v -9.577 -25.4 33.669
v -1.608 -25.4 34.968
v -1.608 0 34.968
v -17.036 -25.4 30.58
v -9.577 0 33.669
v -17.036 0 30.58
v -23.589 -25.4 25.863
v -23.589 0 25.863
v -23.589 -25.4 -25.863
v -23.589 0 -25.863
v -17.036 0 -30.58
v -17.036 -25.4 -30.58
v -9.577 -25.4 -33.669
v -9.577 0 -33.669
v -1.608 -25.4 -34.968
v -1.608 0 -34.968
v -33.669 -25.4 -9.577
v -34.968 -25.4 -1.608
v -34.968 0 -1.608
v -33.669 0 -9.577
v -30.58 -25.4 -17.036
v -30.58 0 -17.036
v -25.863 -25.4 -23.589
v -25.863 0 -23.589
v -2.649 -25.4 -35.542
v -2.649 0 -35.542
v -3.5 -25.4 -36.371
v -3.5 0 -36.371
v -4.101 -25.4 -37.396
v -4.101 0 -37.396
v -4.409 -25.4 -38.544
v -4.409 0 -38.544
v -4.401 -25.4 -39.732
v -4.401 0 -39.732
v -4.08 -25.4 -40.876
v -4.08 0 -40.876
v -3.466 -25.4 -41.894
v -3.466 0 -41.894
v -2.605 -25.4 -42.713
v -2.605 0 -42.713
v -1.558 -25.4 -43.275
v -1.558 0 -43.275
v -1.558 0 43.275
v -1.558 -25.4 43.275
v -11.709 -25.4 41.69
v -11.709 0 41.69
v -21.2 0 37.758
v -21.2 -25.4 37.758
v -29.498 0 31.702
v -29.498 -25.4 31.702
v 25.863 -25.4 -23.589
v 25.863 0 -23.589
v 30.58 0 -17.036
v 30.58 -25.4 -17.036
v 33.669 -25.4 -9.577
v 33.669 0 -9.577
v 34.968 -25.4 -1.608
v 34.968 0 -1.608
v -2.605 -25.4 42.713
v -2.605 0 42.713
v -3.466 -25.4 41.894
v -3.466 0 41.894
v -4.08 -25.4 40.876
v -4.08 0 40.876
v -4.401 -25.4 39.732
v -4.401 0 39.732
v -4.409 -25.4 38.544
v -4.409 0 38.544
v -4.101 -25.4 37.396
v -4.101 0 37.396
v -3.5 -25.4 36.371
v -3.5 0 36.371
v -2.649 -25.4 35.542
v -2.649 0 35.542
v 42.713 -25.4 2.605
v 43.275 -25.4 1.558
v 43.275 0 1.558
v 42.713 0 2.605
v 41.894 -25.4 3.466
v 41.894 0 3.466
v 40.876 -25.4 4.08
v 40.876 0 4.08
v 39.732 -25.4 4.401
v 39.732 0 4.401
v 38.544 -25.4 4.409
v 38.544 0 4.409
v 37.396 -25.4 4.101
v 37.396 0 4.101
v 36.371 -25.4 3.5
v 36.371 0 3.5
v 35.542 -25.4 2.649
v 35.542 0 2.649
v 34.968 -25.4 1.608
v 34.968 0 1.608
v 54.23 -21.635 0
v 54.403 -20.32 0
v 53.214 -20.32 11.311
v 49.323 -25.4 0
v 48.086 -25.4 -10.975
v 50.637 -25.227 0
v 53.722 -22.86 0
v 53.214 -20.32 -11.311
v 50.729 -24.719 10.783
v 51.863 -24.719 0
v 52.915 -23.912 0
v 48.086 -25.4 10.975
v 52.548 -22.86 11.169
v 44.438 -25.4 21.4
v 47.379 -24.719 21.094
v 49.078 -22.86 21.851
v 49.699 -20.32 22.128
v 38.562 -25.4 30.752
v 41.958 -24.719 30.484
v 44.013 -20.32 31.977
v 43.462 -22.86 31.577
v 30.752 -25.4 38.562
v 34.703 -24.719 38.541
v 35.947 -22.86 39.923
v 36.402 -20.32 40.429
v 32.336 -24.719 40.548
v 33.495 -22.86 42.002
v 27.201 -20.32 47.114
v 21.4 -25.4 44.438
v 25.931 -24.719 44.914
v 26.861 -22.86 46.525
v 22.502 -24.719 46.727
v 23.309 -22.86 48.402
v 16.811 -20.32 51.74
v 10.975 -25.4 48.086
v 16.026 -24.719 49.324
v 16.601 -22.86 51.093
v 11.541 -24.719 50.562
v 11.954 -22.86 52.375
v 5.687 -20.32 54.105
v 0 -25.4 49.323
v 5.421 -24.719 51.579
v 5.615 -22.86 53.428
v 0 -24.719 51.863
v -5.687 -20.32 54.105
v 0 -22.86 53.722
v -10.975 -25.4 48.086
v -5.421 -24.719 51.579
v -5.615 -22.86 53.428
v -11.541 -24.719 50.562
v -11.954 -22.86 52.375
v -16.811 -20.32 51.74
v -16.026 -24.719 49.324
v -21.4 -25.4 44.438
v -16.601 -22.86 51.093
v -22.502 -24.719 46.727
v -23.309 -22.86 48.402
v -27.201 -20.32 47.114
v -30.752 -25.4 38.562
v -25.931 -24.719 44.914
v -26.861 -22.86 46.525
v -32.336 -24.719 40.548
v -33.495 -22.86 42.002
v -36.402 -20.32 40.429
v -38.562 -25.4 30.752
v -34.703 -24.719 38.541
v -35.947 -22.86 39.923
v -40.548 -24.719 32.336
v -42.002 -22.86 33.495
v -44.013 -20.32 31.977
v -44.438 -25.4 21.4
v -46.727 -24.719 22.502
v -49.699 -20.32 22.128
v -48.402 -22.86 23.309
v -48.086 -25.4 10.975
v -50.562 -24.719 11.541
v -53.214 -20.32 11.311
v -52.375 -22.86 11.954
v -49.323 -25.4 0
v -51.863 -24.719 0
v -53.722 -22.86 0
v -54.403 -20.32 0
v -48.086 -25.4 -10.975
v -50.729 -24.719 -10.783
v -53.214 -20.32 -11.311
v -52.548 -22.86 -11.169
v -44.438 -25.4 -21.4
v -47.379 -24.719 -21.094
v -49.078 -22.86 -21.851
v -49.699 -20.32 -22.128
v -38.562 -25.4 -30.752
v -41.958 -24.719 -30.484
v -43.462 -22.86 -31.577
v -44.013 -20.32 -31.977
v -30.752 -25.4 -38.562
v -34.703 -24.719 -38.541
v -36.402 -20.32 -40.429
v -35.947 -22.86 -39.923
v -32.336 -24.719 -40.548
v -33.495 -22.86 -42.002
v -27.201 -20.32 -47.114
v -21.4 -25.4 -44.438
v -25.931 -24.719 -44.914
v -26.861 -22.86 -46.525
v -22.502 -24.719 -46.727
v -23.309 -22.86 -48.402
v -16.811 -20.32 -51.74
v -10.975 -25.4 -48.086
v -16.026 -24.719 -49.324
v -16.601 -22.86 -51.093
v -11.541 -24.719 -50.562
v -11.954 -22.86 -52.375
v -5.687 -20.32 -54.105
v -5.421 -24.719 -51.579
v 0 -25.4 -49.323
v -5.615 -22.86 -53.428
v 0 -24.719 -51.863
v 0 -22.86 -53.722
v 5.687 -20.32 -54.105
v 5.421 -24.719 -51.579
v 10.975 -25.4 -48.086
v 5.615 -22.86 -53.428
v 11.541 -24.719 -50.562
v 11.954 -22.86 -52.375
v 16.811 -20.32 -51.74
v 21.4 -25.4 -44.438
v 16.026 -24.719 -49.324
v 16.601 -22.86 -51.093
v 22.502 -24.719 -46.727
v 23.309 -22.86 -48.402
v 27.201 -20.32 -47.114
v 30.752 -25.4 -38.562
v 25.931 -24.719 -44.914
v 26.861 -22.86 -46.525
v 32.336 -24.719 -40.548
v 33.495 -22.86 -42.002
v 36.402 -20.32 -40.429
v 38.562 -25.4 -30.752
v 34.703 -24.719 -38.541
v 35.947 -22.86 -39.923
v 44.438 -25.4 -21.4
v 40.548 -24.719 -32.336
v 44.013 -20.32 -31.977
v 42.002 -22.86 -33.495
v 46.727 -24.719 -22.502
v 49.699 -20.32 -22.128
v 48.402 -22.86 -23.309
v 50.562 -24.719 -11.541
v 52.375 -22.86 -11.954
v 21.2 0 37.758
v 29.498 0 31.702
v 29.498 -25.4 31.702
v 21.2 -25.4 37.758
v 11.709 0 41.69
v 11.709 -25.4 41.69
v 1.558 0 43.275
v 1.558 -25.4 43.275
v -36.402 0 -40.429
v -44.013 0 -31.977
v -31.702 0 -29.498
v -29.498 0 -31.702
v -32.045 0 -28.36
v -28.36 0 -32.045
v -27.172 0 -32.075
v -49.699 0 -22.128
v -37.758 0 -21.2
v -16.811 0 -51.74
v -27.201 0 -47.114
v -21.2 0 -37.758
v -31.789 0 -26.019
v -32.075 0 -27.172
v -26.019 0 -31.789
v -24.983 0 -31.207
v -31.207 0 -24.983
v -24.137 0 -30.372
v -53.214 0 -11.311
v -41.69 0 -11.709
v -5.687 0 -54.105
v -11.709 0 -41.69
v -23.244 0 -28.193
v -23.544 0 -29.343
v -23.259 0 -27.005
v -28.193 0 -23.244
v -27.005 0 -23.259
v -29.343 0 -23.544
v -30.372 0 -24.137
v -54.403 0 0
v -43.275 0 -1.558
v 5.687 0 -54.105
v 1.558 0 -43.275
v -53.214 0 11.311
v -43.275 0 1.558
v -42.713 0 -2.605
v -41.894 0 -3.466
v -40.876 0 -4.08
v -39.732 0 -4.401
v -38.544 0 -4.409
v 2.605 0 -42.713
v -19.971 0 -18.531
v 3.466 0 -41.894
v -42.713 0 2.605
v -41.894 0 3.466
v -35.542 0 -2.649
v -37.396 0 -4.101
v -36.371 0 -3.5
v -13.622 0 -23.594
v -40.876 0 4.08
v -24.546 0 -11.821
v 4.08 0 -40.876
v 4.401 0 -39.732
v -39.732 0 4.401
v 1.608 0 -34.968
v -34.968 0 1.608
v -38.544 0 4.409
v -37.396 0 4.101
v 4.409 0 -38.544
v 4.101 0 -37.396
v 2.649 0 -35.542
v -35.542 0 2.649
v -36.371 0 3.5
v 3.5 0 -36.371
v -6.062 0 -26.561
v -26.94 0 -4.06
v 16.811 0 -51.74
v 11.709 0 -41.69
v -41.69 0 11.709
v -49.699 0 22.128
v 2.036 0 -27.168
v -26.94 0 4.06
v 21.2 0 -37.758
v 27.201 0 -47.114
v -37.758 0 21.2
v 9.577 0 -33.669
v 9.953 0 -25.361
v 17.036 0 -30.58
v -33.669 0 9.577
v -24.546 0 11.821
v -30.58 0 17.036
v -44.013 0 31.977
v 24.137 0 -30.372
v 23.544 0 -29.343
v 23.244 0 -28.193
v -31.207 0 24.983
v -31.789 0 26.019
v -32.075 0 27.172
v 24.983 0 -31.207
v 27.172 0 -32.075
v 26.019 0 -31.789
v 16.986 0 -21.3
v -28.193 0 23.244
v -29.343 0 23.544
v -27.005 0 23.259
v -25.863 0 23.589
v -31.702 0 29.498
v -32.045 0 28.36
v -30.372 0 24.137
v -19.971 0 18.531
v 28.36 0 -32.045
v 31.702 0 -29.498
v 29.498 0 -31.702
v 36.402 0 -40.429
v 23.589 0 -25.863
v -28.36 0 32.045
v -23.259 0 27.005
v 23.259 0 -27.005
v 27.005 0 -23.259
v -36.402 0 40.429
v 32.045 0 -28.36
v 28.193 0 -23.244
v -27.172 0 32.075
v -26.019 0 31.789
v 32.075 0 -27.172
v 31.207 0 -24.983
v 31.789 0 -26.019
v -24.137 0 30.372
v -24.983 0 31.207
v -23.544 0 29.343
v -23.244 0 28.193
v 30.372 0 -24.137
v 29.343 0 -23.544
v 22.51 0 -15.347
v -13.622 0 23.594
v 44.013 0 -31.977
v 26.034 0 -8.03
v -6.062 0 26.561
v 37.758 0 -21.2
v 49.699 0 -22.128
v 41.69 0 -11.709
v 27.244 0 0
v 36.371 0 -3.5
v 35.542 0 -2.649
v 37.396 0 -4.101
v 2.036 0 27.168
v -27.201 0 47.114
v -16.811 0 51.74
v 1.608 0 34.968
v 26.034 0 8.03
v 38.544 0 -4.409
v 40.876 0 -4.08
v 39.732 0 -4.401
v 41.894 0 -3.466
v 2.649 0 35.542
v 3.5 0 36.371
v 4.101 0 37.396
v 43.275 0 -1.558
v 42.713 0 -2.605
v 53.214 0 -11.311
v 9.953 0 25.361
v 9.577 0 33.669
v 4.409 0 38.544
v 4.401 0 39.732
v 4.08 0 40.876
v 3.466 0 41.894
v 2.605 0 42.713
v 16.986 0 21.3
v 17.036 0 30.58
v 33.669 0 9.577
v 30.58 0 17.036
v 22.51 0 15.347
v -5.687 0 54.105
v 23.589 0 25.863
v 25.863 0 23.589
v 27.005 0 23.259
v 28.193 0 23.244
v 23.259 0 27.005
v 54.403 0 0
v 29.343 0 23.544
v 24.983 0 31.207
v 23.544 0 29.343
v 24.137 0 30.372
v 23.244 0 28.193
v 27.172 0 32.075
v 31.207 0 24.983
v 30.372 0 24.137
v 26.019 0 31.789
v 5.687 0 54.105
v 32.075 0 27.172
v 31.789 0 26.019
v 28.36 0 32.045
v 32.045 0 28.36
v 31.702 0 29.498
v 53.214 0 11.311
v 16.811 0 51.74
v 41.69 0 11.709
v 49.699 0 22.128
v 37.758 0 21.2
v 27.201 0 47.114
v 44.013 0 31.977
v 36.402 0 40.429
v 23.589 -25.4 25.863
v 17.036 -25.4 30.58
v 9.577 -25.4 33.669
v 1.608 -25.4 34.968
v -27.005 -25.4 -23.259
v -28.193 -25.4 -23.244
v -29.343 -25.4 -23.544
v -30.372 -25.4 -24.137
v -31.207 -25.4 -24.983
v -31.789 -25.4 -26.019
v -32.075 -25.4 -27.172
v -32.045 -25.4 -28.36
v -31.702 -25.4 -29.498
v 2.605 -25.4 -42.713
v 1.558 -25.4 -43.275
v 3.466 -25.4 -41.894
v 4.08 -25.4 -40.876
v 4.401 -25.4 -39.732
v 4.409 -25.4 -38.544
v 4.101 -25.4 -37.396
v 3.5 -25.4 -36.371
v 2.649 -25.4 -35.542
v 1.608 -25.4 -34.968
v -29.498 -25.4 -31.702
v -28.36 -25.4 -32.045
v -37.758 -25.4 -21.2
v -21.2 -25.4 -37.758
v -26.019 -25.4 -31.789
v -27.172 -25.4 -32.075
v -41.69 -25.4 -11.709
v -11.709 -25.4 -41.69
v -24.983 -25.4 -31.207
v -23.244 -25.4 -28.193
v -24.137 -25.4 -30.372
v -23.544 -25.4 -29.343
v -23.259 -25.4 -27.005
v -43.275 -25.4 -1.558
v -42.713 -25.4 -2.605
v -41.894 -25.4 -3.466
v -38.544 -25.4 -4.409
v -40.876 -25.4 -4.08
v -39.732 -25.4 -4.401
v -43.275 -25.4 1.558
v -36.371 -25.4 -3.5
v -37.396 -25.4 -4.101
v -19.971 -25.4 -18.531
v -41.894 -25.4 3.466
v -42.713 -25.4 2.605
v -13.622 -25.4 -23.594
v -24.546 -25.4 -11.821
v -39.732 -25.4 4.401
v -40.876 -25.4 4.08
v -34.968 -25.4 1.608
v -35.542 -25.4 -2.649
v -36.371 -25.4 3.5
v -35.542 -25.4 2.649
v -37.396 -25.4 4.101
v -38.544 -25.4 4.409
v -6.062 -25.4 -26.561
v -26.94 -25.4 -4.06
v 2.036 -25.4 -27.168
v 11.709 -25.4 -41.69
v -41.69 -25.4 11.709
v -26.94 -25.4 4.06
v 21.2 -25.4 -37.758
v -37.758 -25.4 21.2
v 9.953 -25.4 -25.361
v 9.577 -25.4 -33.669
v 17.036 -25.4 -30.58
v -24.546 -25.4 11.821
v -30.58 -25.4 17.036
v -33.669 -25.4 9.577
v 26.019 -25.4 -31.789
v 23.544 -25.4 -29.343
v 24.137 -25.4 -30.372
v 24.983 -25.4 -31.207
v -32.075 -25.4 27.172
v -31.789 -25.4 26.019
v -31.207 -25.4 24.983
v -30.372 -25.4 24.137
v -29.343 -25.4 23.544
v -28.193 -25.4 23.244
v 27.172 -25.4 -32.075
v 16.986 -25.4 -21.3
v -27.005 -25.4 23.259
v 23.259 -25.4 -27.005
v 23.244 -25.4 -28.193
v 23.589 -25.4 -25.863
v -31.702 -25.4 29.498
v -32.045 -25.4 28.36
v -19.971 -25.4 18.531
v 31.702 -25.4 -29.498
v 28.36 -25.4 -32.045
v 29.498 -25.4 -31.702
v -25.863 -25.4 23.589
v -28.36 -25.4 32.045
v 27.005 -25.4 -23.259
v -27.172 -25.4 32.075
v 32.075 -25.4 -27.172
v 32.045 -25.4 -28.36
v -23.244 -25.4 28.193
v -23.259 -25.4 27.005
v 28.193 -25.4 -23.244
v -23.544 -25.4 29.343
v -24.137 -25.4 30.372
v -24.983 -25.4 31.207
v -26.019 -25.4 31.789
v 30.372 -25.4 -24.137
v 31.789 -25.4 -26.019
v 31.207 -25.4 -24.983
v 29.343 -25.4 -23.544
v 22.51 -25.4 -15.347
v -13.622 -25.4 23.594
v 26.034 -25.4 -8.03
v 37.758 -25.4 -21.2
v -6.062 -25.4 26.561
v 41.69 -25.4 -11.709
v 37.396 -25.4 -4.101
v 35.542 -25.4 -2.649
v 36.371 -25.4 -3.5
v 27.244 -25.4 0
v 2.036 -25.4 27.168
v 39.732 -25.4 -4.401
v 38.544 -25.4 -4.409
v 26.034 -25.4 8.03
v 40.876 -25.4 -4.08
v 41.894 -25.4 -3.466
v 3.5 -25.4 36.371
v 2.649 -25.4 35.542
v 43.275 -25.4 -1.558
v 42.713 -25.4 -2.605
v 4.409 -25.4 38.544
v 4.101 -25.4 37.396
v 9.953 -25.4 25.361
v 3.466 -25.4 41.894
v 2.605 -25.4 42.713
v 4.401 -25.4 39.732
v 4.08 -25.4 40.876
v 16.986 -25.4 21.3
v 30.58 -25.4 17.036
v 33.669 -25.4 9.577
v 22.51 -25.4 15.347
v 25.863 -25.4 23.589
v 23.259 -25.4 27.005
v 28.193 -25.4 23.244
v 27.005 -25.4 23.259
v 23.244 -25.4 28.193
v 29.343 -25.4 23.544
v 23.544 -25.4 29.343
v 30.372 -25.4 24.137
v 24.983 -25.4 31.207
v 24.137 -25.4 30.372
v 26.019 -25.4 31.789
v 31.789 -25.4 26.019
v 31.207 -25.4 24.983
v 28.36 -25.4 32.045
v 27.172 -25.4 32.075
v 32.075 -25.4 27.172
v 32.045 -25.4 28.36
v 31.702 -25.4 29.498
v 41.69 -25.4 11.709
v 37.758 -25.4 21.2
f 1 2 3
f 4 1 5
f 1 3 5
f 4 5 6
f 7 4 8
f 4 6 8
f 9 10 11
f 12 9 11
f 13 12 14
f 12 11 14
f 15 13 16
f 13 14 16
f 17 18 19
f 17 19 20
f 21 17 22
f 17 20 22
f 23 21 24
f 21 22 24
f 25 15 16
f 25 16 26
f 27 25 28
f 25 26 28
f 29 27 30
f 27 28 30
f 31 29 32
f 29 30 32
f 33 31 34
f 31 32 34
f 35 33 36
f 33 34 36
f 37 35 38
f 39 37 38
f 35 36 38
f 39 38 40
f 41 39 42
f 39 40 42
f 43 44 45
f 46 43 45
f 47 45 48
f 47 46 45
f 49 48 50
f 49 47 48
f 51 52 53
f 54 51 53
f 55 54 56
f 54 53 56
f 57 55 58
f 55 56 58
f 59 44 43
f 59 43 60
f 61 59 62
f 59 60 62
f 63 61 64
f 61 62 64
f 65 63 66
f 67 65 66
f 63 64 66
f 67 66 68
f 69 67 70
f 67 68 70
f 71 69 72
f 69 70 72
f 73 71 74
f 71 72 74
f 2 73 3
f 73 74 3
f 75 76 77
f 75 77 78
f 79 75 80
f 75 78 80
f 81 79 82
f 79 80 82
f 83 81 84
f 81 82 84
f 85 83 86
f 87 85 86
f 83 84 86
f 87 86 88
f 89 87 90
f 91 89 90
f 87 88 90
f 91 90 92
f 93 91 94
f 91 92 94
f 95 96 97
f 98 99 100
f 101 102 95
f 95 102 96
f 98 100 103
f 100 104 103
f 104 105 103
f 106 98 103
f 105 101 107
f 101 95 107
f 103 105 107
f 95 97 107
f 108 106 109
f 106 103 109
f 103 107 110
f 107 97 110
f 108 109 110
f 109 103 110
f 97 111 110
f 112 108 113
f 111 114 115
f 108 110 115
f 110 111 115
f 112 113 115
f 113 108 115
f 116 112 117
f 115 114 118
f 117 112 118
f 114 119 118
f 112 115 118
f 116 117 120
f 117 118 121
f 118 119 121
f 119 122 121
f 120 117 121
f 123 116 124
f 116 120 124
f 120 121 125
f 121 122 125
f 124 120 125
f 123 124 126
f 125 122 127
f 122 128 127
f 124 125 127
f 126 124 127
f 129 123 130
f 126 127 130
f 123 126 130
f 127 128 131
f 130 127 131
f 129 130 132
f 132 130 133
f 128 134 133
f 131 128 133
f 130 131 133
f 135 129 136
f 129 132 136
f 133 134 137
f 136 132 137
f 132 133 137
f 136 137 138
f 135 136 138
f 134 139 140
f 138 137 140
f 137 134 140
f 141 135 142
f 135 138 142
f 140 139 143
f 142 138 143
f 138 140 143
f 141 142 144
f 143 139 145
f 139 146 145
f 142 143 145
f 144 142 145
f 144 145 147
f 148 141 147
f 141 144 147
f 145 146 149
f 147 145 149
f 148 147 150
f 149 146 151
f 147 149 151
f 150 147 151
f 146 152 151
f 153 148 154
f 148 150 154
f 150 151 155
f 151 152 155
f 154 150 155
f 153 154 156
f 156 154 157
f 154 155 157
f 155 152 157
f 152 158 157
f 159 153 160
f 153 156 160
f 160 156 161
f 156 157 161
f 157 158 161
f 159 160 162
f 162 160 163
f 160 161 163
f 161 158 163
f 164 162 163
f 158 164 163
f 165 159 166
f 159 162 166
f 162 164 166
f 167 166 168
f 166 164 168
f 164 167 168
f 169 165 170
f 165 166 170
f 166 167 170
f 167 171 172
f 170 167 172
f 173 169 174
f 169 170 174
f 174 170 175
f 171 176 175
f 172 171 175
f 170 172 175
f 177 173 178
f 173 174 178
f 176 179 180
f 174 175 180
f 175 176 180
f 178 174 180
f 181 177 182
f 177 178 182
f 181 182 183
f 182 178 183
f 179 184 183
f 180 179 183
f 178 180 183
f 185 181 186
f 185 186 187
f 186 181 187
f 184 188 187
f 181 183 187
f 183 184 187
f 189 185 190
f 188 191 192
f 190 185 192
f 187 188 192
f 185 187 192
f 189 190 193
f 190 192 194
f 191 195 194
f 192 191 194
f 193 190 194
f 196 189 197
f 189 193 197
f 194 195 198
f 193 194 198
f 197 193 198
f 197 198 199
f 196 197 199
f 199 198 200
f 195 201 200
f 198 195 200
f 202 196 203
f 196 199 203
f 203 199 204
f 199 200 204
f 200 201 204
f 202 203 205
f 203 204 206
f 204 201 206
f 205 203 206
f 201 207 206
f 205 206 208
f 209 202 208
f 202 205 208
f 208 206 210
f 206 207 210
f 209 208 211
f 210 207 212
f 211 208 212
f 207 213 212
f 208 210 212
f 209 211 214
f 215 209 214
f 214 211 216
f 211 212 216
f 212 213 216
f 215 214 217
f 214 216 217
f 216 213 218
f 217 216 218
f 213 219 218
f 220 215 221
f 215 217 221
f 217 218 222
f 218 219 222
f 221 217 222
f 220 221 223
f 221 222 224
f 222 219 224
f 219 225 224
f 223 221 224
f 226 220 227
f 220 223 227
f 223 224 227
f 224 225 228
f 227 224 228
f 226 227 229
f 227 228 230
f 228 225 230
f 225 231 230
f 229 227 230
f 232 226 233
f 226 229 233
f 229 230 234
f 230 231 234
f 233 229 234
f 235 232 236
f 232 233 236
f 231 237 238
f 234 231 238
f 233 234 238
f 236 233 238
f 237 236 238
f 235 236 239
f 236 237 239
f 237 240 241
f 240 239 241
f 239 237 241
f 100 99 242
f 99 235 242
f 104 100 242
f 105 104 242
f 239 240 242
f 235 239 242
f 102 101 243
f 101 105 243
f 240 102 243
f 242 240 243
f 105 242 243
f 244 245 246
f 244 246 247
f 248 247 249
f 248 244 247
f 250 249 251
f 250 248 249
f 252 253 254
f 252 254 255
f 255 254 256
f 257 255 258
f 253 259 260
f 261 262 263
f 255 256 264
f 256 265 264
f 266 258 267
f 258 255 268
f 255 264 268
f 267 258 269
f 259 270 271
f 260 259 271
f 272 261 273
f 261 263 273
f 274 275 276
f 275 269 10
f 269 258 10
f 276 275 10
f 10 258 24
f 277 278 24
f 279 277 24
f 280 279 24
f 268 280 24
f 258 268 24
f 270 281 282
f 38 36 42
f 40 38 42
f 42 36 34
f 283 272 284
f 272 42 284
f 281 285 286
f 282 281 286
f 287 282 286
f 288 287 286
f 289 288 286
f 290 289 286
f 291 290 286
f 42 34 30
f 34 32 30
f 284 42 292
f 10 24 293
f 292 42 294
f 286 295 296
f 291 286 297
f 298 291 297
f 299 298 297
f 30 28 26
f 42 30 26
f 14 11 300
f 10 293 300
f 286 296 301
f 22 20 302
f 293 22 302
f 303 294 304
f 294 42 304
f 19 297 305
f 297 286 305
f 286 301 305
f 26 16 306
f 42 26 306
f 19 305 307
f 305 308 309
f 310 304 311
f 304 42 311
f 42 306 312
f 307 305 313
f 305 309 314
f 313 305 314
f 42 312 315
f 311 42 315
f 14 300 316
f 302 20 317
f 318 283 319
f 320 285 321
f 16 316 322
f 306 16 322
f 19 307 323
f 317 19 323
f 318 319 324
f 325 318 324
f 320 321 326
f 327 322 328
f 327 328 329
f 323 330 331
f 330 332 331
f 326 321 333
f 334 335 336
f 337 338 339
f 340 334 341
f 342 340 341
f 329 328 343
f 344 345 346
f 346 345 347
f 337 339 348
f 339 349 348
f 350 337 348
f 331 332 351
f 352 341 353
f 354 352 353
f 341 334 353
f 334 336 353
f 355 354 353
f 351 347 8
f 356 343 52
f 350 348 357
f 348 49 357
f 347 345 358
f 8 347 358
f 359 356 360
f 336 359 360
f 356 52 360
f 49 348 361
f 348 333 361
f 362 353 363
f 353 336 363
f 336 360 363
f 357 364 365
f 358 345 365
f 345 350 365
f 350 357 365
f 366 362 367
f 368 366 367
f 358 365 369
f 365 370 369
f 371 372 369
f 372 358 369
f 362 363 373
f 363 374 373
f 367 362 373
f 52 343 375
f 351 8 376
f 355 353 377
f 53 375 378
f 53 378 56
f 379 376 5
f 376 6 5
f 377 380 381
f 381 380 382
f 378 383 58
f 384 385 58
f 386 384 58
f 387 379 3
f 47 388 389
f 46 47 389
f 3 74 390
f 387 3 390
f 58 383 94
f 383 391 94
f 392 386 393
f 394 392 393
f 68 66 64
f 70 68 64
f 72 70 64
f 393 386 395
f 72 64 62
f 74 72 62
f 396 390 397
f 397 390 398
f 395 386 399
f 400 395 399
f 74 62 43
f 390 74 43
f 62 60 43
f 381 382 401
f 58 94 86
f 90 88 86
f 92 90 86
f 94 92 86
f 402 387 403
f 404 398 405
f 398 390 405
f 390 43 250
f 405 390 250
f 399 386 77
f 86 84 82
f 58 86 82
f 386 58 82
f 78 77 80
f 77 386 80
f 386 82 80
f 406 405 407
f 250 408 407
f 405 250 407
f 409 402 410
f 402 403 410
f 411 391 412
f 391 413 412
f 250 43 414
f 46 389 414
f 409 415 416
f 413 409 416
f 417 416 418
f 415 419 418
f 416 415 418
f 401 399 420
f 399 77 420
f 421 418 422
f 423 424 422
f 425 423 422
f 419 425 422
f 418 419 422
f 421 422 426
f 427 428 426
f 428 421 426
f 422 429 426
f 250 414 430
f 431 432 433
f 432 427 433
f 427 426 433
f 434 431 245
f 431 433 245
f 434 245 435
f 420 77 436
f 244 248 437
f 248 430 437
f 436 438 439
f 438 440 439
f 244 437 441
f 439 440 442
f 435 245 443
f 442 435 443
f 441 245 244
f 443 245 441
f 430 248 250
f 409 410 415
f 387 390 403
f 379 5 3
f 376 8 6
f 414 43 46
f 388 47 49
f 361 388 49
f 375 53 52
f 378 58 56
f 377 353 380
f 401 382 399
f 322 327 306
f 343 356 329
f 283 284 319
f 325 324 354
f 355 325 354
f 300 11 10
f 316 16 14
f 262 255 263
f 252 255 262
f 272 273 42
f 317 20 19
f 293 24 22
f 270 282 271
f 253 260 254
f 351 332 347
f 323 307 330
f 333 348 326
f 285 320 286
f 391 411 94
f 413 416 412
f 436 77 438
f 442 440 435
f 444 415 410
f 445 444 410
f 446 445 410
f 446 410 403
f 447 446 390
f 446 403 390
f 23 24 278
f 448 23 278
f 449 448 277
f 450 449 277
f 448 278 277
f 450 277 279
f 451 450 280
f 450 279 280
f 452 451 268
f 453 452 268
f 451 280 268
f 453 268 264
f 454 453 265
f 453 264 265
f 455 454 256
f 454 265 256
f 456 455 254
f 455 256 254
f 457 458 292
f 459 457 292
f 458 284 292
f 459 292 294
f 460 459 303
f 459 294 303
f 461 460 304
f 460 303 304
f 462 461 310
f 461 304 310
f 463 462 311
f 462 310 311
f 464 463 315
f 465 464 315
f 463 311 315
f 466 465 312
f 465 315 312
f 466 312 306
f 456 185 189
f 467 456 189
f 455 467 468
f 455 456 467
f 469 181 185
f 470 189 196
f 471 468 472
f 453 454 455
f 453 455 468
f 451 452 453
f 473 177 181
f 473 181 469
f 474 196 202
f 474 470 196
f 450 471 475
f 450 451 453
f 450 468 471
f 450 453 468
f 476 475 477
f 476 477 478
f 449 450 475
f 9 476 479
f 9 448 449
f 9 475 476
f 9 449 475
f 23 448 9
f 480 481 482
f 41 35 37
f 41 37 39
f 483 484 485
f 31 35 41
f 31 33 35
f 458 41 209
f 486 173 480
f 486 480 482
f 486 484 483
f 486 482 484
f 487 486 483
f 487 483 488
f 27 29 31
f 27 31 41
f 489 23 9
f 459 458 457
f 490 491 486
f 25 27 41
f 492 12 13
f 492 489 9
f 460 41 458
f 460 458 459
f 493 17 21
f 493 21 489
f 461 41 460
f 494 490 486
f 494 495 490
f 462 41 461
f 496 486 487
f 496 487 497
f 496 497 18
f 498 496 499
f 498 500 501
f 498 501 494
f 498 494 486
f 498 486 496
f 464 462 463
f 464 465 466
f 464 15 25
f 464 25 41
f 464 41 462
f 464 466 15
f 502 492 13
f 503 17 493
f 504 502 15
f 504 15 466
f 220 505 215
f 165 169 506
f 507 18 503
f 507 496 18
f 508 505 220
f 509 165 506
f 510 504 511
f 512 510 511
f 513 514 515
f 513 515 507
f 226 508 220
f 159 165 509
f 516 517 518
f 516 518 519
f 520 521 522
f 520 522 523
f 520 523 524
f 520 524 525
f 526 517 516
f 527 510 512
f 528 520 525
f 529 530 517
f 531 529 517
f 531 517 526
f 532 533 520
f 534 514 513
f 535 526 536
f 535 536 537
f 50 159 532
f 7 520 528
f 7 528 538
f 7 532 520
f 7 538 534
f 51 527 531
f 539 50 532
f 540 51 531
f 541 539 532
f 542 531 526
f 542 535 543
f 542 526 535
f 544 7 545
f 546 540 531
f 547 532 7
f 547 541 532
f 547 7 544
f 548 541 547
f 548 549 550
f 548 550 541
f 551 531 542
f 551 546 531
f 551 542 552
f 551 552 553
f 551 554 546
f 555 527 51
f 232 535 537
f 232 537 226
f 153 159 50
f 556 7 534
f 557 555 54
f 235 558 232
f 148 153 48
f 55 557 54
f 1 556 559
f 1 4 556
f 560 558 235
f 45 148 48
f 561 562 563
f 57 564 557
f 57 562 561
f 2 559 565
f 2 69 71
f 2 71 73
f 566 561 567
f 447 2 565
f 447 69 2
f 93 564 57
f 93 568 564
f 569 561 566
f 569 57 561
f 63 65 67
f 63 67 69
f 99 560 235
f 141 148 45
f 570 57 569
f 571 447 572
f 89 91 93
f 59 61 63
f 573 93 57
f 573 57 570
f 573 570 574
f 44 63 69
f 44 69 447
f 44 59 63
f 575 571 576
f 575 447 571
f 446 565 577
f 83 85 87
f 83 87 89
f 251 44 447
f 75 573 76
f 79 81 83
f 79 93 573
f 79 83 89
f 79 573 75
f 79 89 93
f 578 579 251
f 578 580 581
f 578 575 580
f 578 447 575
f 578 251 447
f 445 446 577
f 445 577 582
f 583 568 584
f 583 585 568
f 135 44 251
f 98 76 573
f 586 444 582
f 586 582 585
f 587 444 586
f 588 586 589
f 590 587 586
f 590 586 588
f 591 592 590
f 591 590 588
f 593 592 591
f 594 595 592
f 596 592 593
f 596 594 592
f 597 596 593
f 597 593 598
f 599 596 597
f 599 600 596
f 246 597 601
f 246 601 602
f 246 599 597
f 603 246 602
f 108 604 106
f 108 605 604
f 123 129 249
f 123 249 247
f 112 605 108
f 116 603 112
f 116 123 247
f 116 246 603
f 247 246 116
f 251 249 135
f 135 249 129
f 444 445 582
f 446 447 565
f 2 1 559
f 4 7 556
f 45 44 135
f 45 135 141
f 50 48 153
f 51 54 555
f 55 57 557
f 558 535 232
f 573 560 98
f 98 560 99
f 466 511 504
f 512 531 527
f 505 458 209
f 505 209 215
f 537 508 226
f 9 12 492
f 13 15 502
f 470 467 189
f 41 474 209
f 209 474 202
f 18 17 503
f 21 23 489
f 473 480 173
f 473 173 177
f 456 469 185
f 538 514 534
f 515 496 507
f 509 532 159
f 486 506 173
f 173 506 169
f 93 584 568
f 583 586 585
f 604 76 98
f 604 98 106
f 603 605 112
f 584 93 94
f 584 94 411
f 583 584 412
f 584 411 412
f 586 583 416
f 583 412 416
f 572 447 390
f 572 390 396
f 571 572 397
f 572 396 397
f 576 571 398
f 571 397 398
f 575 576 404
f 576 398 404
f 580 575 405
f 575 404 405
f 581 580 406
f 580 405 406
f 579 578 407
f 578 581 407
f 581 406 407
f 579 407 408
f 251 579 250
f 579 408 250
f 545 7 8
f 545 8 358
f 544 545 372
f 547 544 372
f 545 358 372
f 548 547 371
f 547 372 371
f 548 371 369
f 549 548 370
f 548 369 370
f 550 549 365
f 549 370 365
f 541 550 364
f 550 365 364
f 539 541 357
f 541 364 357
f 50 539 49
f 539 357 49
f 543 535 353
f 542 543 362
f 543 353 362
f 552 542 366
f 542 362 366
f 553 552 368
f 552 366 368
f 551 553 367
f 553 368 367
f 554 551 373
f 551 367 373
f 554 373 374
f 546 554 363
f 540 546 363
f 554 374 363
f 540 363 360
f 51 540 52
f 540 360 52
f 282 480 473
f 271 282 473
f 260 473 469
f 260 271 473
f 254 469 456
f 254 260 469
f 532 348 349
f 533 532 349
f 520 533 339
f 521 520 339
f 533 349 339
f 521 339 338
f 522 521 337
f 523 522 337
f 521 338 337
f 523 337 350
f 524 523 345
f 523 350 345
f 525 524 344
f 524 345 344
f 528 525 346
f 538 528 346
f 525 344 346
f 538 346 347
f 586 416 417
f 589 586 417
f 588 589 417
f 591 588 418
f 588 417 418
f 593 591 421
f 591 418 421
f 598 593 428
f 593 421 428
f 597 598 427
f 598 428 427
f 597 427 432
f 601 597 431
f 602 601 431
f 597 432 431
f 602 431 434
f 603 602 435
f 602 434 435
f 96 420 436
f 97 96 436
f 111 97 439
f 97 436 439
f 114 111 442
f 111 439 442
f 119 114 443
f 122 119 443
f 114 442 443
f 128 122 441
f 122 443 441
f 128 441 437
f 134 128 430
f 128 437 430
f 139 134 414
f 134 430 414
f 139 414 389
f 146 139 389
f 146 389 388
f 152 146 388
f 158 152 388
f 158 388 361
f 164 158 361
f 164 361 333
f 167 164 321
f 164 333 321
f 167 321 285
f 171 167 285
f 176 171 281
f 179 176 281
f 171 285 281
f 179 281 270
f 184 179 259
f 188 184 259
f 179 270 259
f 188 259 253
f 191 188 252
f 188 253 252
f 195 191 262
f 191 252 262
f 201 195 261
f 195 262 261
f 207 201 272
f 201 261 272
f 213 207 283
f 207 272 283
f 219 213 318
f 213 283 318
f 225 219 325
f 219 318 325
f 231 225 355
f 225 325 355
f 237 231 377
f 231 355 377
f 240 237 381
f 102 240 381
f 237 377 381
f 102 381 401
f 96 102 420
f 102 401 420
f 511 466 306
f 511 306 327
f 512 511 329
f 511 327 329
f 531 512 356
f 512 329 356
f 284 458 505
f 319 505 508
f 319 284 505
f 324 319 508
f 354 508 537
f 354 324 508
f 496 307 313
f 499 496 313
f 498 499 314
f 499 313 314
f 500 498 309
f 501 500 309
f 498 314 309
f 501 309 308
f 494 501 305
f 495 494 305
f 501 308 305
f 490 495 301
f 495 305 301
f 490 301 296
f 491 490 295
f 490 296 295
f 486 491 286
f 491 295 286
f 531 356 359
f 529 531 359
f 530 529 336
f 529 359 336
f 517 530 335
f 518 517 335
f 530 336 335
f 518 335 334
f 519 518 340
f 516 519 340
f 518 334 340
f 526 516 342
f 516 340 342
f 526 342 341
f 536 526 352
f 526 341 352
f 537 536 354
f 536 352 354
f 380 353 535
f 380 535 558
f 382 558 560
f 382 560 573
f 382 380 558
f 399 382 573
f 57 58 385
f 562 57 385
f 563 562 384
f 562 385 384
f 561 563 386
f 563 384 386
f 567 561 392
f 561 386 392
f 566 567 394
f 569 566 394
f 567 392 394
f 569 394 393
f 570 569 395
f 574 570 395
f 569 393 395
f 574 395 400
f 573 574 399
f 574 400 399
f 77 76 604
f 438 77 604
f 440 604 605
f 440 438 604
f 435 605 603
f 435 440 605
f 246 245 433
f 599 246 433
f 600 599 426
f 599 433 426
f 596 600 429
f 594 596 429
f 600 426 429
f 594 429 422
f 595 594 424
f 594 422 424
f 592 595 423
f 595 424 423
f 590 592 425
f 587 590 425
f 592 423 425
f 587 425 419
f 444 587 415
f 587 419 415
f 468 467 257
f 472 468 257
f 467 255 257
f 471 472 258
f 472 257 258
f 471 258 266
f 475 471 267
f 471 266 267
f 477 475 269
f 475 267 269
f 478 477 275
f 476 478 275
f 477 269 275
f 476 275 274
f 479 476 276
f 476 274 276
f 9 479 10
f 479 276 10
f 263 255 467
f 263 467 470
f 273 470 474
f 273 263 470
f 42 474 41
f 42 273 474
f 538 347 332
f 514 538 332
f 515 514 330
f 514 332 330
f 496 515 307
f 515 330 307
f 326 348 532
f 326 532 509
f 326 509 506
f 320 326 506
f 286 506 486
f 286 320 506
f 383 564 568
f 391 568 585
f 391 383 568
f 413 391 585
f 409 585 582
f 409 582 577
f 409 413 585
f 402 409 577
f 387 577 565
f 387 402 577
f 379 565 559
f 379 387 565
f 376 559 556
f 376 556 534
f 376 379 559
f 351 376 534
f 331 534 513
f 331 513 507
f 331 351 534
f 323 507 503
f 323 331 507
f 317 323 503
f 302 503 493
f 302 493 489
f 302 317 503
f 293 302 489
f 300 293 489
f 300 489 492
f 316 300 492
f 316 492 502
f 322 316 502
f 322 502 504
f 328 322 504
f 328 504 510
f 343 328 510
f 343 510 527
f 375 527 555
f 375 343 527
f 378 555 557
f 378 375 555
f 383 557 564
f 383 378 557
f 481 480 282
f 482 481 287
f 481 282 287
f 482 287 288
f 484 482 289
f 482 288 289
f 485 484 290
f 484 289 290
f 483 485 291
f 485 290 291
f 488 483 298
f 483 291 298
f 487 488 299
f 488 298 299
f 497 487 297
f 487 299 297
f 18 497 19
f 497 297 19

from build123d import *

# Parameters (mm, degrees)
F0_R     = 54.402648
F0_R_2   = 43.302675
F1_DEPTH = 25.4
F2_R     = 35.004795
F2_R_2   = 27.243886
F3_DEPTH = 25.4
F4_R     = 4.445
F5_DEPTH = 25.4
F6_R     = 5.08


with BuildPart() as f1:
    # F0 (on Front) → F1 (new body)
    with BuildSketch(Plane.XZ):
        Circle(F0_R)
        Circle(F0_R_2, mode=Mode.SUBTRACT)
    extrude(amount=F1_DEPTH)



with BuildPart() as f3:
    # F2 (on Front) → F3 (new body)
    with BuildSketch(Plane.XZ):
        Circle(F2_R)
        Circle(F2_R_2, mode=Mode.SUBTRACT)
    extrude(amount=F3_DEPTH)


with BuildPart() as f1_1:
    add(f1.part)

    add(f3.part)  # F5 merges F3
    # F4 (on Front) → F5 (join)
    with BuildSketch(Plane.XZ):
        with Locations((0, 39.111675)):
            Circle(F4_R)
        with Locations((-27.65613, 27.65613)):
            Circle(F4_R)
        with Locations((-39.111675, 0)):
            Circle(F4_R)
        with Locations((-27.65613, -27.65613)):
            Circle(F4_R)
        with Locations((0, -39.111675)):
            Circle(F4_R)
        with Locations((27.65613, -27.65613)):
            Circle(F4_R)
        with Locations((39.111675, 0)):
            Circle(F4_R)
        with Locations((27.65613, 27.65613)):
            Circle(F4_R)
    extrude(amount=F5_DEPTH)

    # F6
    f6_edges = [f1_1.edges().sort_by_distance(p)[0] for p in [
        (-54.402648, -25.4, 0),
    ]]
    fillet(f6_edges, radius=F6_R)


solid = f1_1.part
